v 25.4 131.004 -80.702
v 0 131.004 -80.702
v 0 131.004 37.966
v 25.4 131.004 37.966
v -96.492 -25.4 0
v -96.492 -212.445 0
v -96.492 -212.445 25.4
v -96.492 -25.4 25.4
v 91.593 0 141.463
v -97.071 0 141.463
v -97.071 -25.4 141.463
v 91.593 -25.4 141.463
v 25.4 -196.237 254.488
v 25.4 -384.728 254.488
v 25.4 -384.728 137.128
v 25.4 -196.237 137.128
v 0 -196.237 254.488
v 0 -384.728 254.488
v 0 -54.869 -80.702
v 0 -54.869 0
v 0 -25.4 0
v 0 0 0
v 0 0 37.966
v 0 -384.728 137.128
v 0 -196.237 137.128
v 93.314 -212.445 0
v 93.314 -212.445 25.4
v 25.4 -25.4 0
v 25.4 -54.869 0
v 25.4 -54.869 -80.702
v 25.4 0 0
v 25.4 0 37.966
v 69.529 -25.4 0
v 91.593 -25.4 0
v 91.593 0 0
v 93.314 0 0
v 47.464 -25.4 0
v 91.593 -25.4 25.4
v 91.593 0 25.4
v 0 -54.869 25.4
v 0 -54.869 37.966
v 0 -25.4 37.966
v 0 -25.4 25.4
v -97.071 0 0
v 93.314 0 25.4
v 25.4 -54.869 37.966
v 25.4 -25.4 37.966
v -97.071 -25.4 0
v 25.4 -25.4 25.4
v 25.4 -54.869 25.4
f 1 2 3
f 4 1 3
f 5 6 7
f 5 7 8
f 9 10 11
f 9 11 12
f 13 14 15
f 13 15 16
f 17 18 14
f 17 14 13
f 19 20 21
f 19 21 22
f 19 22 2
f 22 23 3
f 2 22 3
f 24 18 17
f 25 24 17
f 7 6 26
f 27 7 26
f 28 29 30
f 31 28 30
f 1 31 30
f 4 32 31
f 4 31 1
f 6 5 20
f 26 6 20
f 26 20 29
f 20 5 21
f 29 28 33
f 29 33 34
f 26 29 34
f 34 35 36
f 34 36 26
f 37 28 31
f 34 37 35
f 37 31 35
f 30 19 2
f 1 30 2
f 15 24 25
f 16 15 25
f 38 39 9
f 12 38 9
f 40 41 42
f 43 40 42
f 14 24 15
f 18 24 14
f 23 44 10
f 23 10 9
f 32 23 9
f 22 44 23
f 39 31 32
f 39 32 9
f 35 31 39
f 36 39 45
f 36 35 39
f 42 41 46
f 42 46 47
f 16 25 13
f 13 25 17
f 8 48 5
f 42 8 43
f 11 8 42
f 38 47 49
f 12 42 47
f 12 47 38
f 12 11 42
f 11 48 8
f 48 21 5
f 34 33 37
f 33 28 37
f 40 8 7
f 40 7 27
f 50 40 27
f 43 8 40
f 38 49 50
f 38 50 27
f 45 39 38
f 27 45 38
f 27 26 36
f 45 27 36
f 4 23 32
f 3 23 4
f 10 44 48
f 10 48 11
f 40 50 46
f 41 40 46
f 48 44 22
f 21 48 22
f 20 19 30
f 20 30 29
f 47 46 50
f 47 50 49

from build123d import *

# Parameters (mm, degrees)
F1_W     = 188.663915
F1_H     = 141.462833
F2_DEPTH = 25.4
F0_W     = 189.805709
F0_H     = 212.445378
F3_DEPTH = 25.4
F4_W     = 188.490927
F4_H     = 117.359251
F5_DEPTH = 25.4
F6_W     = 185.872972
F6_H     = 118.668229
F7_DEPTH = 25.4


with BuildPart() as f2:
    # F1 (on Front) → F2 (new body)
    with BuildSketch(Plane.XZ):
        with Locations((-2.738855, 70.731416)):
            Rectangle(F1_W, F1_H)
    extrude(amount=F2_DEPTH)

    # F0 (on Top) → F3 (join)
    with BuildSketch(Plane.XY):
        with Locations((-1.589205, -106.222689)):
            Rectangle(F0_W, F0_H)
    extrude(amount=F3_DEPTH)

    # F6 (on Right) → F7 (join)
    with BuildSketch(Plane.YZ):
        with Locations((38.067952, -21.368273)):
            Rectangle(F6_W, F6_H)
    extrude(amount=F7_DEPTH)


with BuildPart() as f5:
    # F4 (on Right) → F5 (new body)
    with BuildSketch(Plane.YZ):
        with Locations((-290.482193, 195.807978)):
            Rectangle(F4_W, F4_H)
    extrude(amount=F5_DEPTH)


solid = Compound([f2.part, f5.part])
